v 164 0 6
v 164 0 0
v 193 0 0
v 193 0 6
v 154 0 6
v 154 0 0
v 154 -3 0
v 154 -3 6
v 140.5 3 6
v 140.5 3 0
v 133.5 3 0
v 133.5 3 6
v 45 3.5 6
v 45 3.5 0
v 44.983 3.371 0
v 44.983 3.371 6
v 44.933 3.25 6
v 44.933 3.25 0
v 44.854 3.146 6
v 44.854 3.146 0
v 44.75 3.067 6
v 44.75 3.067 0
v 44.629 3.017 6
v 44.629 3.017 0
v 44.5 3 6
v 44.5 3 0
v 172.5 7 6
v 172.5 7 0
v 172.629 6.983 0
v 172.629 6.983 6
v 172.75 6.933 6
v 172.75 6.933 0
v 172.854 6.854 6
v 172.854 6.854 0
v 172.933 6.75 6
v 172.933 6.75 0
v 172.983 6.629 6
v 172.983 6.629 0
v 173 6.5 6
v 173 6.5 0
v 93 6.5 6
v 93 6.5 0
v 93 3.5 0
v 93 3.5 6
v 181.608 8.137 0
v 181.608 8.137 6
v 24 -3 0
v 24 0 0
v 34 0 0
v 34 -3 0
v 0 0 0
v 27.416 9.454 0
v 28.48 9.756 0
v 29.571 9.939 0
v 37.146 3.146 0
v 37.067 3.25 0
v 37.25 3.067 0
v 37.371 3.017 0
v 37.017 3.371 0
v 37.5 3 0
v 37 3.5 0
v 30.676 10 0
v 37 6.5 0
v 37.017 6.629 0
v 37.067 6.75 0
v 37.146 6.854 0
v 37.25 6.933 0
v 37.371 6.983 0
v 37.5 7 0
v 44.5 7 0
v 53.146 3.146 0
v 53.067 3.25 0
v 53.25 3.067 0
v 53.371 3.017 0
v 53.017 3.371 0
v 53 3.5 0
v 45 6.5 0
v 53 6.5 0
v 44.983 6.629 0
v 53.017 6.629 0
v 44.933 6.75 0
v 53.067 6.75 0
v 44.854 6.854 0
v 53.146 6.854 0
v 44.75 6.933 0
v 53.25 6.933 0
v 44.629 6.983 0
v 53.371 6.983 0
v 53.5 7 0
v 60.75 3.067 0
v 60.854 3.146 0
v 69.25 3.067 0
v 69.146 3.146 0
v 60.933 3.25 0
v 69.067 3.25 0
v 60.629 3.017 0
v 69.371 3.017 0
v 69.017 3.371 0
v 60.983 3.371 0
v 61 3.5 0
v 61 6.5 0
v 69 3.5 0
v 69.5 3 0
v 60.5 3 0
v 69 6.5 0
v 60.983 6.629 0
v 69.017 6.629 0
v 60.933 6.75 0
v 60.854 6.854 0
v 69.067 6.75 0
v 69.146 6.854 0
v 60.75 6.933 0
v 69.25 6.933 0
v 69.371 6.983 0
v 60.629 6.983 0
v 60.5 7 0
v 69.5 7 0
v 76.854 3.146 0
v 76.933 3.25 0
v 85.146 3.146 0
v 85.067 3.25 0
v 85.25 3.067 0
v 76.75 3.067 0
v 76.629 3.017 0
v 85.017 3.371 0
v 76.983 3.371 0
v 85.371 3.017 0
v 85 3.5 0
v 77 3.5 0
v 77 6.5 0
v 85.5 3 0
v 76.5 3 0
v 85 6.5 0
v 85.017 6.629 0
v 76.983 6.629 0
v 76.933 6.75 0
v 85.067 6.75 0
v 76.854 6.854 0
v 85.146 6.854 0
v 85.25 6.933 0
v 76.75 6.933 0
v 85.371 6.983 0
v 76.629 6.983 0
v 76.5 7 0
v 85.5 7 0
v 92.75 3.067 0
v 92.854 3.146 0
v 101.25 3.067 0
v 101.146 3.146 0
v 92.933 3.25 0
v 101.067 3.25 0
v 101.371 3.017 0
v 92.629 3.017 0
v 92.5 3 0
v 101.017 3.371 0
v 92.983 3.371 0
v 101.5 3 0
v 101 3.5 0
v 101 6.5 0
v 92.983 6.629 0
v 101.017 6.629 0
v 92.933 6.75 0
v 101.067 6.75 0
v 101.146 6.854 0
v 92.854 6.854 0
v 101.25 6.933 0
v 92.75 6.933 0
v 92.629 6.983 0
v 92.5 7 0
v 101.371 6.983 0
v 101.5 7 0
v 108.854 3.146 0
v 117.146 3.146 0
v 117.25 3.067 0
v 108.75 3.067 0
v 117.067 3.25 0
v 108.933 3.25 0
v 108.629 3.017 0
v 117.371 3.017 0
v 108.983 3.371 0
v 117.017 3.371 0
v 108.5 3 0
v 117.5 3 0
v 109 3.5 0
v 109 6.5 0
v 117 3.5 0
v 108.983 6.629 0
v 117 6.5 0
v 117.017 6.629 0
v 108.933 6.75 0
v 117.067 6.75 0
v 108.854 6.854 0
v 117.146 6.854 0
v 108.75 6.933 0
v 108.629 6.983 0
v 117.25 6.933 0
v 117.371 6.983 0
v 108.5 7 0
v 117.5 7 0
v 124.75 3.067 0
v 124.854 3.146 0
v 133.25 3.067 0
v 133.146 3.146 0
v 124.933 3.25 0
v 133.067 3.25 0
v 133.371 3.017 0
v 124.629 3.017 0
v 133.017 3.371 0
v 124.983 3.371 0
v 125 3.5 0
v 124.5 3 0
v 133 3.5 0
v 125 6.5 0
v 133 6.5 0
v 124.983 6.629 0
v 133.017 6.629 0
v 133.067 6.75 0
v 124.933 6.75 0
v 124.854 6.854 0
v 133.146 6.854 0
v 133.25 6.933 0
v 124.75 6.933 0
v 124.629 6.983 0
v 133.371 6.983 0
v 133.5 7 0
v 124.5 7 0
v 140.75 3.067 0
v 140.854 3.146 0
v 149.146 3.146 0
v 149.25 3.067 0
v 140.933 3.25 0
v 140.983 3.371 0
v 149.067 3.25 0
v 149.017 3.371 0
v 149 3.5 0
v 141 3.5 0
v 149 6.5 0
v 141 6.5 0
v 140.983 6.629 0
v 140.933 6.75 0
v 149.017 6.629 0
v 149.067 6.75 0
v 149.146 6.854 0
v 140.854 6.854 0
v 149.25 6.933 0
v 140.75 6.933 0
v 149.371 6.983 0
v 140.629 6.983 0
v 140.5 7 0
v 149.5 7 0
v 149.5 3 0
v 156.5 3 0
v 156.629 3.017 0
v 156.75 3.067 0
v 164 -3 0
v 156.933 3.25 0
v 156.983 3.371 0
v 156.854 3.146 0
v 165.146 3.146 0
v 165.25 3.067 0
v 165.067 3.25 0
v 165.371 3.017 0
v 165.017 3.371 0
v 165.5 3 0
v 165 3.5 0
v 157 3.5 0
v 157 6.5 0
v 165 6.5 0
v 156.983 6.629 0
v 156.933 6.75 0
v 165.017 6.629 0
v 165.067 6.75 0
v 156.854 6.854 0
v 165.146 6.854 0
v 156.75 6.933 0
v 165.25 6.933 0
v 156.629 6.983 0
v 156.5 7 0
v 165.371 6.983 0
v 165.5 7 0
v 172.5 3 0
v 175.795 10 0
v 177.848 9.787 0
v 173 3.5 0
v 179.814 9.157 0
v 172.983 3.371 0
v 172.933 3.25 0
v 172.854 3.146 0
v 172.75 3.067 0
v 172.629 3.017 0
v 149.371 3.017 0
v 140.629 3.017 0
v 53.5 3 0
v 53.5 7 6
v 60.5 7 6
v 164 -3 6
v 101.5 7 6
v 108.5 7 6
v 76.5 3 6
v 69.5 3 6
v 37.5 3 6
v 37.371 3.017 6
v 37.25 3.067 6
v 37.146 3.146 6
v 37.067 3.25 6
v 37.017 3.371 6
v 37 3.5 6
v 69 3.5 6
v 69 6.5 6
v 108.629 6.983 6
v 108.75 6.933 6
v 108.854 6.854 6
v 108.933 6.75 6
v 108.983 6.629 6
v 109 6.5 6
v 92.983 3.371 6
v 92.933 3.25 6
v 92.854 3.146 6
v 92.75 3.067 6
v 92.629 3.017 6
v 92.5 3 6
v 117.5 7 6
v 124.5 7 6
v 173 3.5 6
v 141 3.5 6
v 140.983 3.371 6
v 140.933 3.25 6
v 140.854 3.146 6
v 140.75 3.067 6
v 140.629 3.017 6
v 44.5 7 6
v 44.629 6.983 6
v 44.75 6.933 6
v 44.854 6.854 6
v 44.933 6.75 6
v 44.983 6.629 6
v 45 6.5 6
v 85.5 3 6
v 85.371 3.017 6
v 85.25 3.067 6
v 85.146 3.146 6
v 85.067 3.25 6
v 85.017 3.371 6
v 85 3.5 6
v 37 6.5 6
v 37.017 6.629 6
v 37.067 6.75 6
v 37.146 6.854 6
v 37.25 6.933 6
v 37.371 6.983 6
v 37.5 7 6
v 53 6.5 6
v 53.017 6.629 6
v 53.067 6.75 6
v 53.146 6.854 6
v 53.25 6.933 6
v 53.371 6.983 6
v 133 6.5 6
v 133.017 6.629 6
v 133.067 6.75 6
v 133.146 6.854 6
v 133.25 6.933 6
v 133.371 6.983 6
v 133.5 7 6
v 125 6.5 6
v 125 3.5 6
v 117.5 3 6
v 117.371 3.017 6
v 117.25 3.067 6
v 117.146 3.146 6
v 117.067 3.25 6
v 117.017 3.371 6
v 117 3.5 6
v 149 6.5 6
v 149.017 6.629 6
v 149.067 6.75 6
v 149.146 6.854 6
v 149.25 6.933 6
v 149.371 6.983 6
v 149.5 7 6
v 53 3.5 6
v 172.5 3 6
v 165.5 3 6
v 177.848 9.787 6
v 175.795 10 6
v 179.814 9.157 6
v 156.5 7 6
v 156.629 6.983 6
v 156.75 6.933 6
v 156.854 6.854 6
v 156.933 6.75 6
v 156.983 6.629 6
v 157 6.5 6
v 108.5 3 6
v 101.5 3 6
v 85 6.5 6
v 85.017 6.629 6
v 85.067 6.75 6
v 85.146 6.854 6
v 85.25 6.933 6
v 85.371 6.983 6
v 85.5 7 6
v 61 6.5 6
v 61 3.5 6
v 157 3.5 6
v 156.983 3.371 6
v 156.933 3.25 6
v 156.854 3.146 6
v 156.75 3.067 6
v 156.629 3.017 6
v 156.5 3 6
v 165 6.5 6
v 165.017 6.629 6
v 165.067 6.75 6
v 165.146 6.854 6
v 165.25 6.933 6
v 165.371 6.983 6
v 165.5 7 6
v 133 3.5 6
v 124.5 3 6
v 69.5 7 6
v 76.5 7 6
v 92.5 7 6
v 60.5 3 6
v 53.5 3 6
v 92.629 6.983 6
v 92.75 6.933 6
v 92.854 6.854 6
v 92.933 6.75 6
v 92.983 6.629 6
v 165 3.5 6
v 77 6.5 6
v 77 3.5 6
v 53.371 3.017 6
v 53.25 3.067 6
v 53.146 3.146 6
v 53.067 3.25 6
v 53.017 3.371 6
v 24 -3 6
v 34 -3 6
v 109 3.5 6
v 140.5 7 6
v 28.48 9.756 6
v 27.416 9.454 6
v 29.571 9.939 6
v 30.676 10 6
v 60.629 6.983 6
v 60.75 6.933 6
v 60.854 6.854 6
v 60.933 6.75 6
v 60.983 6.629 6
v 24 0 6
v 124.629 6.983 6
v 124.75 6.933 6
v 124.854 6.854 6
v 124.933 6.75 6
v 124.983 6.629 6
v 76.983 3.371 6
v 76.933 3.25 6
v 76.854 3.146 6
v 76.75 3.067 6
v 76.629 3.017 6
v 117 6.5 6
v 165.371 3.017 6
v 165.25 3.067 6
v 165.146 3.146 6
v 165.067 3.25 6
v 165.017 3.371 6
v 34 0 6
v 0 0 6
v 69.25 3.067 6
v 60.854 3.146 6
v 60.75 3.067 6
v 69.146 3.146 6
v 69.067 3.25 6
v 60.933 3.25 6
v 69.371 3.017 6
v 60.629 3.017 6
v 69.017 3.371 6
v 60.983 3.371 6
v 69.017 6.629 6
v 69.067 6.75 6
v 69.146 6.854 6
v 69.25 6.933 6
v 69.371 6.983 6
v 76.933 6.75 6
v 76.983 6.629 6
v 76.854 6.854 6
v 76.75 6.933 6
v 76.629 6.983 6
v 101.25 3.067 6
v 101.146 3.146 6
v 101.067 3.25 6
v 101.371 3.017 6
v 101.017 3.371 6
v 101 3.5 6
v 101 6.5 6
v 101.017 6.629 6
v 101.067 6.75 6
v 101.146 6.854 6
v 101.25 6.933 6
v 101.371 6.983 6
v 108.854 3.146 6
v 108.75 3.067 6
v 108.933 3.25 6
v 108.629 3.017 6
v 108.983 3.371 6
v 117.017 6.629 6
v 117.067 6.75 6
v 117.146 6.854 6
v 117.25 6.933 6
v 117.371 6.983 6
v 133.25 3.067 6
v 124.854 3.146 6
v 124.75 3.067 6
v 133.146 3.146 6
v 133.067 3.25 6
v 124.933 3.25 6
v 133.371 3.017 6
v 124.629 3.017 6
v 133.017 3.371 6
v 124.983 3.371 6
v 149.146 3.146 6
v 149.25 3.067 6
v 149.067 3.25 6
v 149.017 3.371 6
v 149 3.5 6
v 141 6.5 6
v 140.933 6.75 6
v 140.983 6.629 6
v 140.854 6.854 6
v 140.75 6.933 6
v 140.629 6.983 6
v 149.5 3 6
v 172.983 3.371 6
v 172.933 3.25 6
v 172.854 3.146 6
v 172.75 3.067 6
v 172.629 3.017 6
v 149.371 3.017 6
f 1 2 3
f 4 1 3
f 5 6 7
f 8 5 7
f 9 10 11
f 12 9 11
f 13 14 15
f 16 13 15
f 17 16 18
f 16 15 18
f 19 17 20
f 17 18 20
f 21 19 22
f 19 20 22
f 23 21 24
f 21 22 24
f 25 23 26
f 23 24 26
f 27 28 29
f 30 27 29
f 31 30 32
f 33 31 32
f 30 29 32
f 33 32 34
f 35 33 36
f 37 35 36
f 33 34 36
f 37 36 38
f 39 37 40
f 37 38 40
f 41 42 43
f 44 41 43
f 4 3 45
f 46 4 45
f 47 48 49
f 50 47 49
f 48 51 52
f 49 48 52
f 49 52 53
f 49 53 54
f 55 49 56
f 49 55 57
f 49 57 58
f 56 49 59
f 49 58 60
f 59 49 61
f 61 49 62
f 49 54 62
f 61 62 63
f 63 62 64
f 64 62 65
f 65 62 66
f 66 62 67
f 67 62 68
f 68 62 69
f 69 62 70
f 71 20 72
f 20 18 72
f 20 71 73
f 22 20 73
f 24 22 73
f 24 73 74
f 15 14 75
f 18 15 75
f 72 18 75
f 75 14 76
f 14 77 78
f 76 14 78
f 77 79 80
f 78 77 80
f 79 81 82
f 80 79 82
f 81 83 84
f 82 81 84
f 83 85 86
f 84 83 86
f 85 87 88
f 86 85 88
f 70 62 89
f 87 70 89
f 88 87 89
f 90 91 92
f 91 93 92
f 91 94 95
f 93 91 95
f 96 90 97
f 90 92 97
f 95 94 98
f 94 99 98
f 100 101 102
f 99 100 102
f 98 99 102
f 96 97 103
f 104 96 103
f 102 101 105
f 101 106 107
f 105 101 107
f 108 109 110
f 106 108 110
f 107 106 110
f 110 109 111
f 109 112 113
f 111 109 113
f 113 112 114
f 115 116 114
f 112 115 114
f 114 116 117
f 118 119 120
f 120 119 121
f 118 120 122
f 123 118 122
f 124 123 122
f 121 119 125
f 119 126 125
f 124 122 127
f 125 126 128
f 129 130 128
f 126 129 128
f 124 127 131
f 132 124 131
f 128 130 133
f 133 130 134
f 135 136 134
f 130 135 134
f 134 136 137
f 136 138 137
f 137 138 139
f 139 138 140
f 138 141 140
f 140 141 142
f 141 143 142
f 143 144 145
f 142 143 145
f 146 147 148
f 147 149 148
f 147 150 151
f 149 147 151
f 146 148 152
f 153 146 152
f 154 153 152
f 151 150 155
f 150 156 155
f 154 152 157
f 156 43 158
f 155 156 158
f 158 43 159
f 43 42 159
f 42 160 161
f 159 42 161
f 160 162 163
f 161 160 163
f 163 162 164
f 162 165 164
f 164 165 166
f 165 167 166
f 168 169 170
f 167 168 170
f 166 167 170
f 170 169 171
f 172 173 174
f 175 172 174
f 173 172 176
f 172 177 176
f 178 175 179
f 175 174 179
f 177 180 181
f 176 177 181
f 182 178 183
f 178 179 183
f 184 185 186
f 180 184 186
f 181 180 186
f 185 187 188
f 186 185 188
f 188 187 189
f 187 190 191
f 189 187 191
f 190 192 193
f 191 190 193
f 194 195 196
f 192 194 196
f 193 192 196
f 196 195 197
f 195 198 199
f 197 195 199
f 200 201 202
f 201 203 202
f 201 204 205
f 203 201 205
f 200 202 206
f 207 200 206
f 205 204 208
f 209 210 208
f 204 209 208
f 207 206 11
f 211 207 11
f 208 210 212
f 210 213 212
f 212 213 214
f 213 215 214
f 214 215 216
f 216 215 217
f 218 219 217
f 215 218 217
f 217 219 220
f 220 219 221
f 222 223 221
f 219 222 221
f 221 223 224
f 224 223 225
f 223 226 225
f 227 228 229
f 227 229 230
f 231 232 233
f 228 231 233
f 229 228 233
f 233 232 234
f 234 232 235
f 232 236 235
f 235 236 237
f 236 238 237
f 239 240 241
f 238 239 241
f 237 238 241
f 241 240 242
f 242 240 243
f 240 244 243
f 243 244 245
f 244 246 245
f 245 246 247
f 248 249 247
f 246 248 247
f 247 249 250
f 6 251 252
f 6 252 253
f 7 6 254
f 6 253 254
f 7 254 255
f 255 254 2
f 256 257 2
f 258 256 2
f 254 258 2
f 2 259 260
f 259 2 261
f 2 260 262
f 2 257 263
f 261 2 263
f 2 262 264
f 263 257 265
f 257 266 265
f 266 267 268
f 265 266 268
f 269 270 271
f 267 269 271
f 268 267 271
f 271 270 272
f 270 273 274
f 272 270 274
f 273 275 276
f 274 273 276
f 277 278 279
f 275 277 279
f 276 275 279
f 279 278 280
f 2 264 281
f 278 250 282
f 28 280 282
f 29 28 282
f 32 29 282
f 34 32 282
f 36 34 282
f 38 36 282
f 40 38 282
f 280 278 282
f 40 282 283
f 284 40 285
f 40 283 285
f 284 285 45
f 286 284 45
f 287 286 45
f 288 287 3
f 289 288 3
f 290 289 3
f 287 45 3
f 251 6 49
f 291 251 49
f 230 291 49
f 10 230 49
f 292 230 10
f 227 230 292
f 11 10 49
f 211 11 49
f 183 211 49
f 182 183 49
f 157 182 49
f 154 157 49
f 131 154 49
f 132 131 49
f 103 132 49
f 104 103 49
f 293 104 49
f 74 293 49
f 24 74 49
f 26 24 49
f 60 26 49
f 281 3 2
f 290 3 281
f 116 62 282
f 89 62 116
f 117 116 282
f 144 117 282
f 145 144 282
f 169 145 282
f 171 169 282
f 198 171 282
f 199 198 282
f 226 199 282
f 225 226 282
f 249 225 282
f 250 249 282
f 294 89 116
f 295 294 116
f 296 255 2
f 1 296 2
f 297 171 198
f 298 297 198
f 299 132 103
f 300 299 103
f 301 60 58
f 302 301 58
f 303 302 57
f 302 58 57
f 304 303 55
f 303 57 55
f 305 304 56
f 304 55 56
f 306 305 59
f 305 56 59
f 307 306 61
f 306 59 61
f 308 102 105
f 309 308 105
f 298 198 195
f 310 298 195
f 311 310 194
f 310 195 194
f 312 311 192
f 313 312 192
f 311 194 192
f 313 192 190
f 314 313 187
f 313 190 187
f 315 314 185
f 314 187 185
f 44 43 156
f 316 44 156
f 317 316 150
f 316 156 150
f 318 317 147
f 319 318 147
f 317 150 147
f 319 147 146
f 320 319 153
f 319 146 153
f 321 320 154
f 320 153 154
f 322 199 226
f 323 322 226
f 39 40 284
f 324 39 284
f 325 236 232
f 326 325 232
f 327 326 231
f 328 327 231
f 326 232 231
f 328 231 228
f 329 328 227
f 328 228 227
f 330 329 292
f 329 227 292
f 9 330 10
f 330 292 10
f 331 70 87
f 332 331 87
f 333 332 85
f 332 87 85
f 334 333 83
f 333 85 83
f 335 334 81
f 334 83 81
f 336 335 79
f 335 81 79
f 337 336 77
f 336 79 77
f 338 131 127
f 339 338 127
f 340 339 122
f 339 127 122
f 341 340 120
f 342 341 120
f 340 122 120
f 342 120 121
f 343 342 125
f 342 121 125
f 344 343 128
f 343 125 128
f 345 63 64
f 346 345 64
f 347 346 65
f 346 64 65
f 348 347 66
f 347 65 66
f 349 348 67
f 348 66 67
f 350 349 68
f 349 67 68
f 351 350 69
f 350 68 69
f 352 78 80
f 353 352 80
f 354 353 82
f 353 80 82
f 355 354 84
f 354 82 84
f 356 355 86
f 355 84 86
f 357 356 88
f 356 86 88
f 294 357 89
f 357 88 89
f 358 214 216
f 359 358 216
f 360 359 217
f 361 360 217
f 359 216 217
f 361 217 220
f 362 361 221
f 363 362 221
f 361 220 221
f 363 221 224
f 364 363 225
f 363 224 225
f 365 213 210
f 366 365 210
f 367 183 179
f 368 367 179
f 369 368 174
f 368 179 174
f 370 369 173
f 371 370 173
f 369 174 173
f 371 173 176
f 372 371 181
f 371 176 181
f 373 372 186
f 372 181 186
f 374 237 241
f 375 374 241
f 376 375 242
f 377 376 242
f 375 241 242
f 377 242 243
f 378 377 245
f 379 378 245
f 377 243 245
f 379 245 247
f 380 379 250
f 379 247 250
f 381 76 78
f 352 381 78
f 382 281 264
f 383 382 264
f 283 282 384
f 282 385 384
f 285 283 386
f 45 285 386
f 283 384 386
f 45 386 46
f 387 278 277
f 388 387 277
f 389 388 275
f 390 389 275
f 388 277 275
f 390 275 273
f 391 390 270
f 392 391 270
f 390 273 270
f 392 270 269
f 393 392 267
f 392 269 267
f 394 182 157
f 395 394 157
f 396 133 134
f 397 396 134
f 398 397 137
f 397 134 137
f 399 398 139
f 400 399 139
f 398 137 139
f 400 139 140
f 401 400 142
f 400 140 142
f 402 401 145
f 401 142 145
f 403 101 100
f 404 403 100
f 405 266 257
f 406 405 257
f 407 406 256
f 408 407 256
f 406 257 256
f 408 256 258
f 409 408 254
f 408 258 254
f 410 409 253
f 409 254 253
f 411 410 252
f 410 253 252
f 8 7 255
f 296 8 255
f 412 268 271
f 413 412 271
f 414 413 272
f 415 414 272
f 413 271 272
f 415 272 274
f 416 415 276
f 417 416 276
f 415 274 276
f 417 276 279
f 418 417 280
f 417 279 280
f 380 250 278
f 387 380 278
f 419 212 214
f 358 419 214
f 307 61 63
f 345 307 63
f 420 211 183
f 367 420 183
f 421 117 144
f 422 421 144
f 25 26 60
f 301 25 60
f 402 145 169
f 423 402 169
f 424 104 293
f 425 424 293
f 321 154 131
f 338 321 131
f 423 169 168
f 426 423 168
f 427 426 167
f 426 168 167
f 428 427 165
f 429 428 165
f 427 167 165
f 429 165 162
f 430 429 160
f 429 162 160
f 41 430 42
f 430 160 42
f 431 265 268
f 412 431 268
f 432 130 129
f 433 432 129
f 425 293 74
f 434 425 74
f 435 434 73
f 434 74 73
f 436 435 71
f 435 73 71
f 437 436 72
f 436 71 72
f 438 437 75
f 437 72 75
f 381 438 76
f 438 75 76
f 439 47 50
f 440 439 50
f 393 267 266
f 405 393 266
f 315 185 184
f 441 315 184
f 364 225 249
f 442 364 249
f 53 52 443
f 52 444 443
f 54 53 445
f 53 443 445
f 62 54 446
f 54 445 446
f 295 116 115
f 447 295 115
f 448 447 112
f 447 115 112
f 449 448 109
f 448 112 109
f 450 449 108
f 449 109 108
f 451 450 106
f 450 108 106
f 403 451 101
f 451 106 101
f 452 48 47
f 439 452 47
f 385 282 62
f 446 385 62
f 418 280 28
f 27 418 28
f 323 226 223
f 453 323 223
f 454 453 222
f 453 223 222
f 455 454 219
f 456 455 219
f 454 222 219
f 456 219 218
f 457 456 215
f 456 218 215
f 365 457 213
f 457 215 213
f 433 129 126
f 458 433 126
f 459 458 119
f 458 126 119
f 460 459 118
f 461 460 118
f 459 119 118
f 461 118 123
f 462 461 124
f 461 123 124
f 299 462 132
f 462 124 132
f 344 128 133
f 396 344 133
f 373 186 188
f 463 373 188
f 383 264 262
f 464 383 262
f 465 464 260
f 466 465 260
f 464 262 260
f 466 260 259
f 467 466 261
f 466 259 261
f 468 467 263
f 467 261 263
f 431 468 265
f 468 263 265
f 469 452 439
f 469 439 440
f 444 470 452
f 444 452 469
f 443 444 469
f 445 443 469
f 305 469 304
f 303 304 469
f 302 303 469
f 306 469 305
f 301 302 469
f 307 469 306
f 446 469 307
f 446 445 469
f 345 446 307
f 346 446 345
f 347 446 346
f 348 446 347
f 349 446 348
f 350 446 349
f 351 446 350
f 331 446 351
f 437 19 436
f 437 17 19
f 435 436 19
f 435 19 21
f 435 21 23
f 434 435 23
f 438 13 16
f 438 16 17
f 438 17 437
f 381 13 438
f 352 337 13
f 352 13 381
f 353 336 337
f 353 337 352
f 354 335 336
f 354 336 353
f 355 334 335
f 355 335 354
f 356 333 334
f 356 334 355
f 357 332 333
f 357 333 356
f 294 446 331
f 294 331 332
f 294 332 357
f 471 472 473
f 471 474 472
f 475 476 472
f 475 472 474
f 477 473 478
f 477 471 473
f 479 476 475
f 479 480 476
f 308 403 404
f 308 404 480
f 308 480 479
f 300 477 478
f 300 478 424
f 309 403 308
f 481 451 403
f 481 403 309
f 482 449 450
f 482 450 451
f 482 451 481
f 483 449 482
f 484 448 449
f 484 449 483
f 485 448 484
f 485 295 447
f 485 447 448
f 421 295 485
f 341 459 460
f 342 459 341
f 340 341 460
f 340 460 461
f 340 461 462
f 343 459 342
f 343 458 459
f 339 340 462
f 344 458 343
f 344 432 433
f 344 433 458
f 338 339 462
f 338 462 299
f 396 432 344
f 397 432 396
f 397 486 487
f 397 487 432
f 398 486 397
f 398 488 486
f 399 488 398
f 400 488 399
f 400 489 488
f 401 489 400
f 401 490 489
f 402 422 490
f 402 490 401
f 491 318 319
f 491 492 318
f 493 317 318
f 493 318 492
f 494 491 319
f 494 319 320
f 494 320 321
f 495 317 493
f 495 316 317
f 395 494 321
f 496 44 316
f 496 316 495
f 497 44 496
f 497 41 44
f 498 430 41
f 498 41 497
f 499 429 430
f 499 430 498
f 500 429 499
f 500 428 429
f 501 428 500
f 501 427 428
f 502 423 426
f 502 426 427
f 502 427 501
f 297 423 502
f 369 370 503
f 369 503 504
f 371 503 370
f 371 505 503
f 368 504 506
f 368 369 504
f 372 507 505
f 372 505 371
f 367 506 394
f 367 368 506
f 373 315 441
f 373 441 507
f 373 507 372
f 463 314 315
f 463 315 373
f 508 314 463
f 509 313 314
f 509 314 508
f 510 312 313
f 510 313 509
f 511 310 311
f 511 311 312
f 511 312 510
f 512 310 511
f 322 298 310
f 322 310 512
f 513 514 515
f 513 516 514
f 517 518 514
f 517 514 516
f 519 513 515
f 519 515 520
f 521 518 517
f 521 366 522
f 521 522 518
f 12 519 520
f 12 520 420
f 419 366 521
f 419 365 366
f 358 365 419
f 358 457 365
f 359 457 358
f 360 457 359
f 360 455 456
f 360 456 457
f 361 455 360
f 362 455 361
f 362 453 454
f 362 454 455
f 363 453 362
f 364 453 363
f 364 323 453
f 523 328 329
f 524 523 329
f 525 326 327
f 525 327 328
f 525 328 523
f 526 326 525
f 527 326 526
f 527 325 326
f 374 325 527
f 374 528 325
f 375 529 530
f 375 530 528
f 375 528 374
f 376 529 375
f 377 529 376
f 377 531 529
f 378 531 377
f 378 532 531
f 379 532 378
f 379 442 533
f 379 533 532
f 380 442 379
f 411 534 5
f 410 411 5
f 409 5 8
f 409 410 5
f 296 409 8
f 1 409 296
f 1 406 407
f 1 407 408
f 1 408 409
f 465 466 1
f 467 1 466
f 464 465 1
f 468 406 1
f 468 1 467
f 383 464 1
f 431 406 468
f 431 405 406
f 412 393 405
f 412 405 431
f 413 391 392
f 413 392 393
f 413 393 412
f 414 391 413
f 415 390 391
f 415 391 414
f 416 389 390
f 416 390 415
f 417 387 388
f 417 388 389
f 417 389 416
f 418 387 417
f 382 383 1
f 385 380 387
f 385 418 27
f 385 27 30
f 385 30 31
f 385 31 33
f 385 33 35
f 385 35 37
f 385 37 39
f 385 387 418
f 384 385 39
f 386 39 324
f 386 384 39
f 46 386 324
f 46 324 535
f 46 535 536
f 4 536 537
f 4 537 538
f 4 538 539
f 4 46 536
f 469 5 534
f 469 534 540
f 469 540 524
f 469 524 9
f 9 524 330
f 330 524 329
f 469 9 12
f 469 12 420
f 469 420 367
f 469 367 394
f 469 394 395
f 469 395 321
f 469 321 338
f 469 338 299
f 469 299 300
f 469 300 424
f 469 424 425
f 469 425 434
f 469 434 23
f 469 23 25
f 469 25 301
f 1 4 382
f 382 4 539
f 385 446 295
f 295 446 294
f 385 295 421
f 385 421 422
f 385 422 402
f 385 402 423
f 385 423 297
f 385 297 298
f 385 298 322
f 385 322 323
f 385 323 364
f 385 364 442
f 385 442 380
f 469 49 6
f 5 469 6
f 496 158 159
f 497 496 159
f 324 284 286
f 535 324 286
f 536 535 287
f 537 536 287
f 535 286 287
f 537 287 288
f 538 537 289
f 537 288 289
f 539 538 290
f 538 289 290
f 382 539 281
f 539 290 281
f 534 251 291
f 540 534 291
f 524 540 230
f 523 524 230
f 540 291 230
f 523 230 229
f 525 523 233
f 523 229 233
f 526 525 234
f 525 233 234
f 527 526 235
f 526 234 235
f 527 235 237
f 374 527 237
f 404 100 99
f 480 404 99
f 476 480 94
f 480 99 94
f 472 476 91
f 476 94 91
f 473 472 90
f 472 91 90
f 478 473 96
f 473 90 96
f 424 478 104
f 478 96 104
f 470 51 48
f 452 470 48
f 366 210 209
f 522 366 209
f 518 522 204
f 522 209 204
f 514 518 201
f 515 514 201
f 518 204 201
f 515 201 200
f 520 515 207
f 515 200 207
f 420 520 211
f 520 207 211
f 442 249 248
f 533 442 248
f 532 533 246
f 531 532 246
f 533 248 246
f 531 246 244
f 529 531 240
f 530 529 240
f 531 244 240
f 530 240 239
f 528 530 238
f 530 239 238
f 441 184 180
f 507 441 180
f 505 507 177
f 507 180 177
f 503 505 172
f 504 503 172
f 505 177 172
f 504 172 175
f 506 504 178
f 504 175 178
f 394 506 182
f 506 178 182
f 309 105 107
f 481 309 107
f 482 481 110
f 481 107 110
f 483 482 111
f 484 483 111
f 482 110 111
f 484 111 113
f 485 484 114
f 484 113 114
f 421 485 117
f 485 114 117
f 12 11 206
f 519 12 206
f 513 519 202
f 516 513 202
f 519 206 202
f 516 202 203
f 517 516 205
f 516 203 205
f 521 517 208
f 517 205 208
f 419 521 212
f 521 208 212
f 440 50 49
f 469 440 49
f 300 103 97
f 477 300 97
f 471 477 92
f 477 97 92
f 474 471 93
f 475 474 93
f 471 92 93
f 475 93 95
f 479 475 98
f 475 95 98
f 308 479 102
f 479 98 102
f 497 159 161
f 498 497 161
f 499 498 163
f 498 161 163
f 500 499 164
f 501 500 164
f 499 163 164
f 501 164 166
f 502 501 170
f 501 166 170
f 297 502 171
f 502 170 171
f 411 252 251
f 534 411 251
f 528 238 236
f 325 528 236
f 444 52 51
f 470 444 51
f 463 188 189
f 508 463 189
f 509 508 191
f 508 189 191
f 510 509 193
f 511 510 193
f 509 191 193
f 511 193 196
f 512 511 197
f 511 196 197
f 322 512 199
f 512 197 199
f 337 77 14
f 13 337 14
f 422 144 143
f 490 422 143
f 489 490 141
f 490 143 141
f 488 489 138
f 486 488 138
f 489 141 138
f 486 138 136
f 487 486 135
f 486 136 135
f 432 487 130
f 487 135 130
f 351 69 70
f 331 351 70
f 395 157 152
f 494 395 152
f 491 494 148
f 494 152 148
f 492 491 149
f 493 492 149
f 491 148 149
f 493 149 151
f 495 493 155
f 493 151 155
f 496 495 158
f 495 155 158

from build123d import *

# Parameters (mm, degrees)
BOSS_EXTRUDE1_DEPTH = 6
FILLET1_R           = 10


with BuildPart() as part:
    # Sketch1 → Boss-Extrude1 (new body)
    with BuildSketch(Plane.XY):
        Polygon((0, 0), (24, 0), (24, -3), (34, -3), (34, 0), (154, 0), (154, -3), (164, -3), (164, 0), (193, 0), (179, 10), (29, 10), align=None)
        with BuildLine():
            Line((53.5, 7), (60.5, 7))
            ThreePointArc((60.5, 7), (60.853553391, 6.853553391), (61, 6.5))
            Line((61, 6.5), (61, 3.5))
            ThreePointArc((61, 3.5), (60.853553391, 3.146446609), (60.5, 3))
            Line((60.5, 3), (53.5, 3))
            ThreePointArc((53.5, 3), (53.146446609, 3.146446609), (53, 3.5))
            Line((53, 3.5), (53, 6.5))
            ThreePointArc((53, 6.5), (53.146446609, 6.853553391), (53.5, 7))
        make_face(mode=Mode.SUBTRACT)
        with BuildLine():
            Line((37.5, 7), (44.5, 7))
            ThreePointArc((44.5, 7), (44.853553391, 6.853553391), (45, 6.5))
            Line((45, 6.5), (45, 3.5))
            ThreePointArc((45, 3.5), (44.853553391, 3.146446609), (44.5, 3))
            Line((44.5, 3), (37.5, 3))
            ThreePointArc((37.5, 3), (37.146446609, 3.146446609), (37, 3.5))
            Line((37, 3.5), (37, 6.5))
            ThreePointArc((37, 6.5), (37.146446609, 6.853553391), (37.5, 7))
        make_face(mode=Mode.SUBTRACT)
        with BuildLine():
            Line((69.5, 7), (76.5, 7))
            ThreePointArc((76.5, 7), (76.853553391, 6.853553391), (77, 6.5))
            Line((77, 6.5), (77, 3.5))
            ThreePointArc((77, 3.5), (76.853553391, 3.146446609), (76.5, 3))
            Line((76.5, 3), (69.5, 3))
            ThreePointArc((69.5, 3), (69.146446609, 3.146446609), (69, 3.5))
            Line((69, 3.5), (69, 6.5))
            ThreePointArc((69, 6.5), (69.146446609, 6.853553391), (69.5, 7))
        make_face(mode=Mode.SUBTRACT)
        with BuildLine():
            Line((85.5, 7), (92.5, 7))
            ThreePointArc((92.5, 7), (92.853553391, 6.853553391), (93, 6.5))
            Line((93, 6.5), (93, 3.5))
            ThreePointArc((93, 3.5), (92.853553391, 3.146446609), (92.5, 3))
            Line((92.5, 3), (85.5, 3))
            ThreePointArc((85.5, 3), (85.146446609, 3.146446609), (85, 3.5))
            Line((85, 3.5), (85, 6.5))
            ThreePointArc((85, 6.5), (85.146446609, 6.853553391), (85.5, 7))
        make_face(mode=Mode.SUBTRACT)
        with BuildLine():
            Line((101.5, 7), (108.5, 7))
            ThreePointArc((108.5, 7), (108.853553391, 6.853553391), (109, 6.5))
            Line((109, 6.5), (109, 3.5))
            ThreePointArc((109, 3.5), (108.853553391, 3.146446609), (108.5, 3))
            Line((108.5, 3), (101.5, 3))
            ThreePointArc((101.5, 3), (101.146446609, 3.146446609), (101, 3.5))
            Line((101, 3.5), (101, 6.5))
            ThreePointArc((101, 6.5), (101.146446609, 6.853553391), (101.5, 7))
        make_face(mode=Mode.SUBTRACT)
        with BuildLine():
            Line((117.5, 7), (124.5, 7))
            ThreePointArc((124.5, 7), (124.853553391, 6.853553391), (125, 6.5))
            Line((125, 6.5), (125, 3.5))
            ThreePointArc((125, 3.5), (124.853553391, 3.146446609), (124.5, 3))
            Line((124.5, 3), (117.5, 3))
            ThreePointArc((117.5, 3), (117.146446609, 3.146446609), (117, 3.5))
            Line((117, 3.5), (117, 6.5))
            ThreePointArc((117, 6.5), (117.146446609, 6.853553391), (117.5, 7))
        make_face(mode=Mode.SUBTRACT)
        with BuildLine():
            Line((133.5, 7), (140.5, 7))
            ThreePointArc((140.5, 7), (140.853553391, 6.853553391), (141, 6.5))
            Line((141, 6.5), (141, 3.5))
            ThreePointArc((141, 3.5), (140.853553391, 3.146446609), (140.5, 3))
            Line((140.5, 3), (133.5, 3))
            ThreePointArc((133.5, 3), (133.146446609, 3.146446609), (133, 3.5))
            Line((133, 3.5), (133, 6.5))
            ThreePointArc((133, 6.5), (133.146446609, 6.853553391), (133.5, 7))
        make_face(mode=Mode.SUBTRACT)
        with BuildLine():
            Line((149.5, 7), (156.5, 7))
            ThreePointArc((156.5, 7), (156.853553391, 6.853553391), (157, 6.5))
            Line((157, 6.5), (157, 3.5))
            ThreePointArc((157, 3.5), (156.853553391, 3.146446609), (156.5, 3))
            Line((156.5, 3), (149.5, 3))
            ThreePointArc((149.5, 3), (149.146446609, 3.146446609), (149, 3.5))
            Line((149, 3.5), (149, 6.5))
            ThreePointArc((149, 6.5), (149.146446609, 6.853553391), (149.5, 7))
        make_face(mode=Mode.SUBTRACT)
        with BuildLine():
            Line((165.5, 7), (172.5, 7))
            ThreePointArc((172.5, 7), (172.853553391, 6.853553391), (173, 6.5))
            Line((173, 6.5), (173, 3.5))
            ThreePointArc((173, 3.5), (172.853553391, 3.146446609), (172.5, 3))
            Line((172.5, 3), (165.5, 3))
            ThreePointArc((165.5, 3), (165.146446609, 3.146446609), (165, 3.5))
            Line((165, 3.5), (165, 6.5))
            ThreePointArc((165, 6.5), (165.146446609, 6.853553391), (165.5, 7))
        make_face(mode=Mode.SUBTRACT)
    extrude(amount=BOSS_EXTRUDE1_DEPTH)

    # Fillet1
    fillet1_edges = [part.edges().sort_by_distance(p)[0] for p in [
        (29, 10, 3),
        (179, 10, 3),
    ]]
    fillet(fillet1_edges, radius=FILLET1_R)


solid = part.part
